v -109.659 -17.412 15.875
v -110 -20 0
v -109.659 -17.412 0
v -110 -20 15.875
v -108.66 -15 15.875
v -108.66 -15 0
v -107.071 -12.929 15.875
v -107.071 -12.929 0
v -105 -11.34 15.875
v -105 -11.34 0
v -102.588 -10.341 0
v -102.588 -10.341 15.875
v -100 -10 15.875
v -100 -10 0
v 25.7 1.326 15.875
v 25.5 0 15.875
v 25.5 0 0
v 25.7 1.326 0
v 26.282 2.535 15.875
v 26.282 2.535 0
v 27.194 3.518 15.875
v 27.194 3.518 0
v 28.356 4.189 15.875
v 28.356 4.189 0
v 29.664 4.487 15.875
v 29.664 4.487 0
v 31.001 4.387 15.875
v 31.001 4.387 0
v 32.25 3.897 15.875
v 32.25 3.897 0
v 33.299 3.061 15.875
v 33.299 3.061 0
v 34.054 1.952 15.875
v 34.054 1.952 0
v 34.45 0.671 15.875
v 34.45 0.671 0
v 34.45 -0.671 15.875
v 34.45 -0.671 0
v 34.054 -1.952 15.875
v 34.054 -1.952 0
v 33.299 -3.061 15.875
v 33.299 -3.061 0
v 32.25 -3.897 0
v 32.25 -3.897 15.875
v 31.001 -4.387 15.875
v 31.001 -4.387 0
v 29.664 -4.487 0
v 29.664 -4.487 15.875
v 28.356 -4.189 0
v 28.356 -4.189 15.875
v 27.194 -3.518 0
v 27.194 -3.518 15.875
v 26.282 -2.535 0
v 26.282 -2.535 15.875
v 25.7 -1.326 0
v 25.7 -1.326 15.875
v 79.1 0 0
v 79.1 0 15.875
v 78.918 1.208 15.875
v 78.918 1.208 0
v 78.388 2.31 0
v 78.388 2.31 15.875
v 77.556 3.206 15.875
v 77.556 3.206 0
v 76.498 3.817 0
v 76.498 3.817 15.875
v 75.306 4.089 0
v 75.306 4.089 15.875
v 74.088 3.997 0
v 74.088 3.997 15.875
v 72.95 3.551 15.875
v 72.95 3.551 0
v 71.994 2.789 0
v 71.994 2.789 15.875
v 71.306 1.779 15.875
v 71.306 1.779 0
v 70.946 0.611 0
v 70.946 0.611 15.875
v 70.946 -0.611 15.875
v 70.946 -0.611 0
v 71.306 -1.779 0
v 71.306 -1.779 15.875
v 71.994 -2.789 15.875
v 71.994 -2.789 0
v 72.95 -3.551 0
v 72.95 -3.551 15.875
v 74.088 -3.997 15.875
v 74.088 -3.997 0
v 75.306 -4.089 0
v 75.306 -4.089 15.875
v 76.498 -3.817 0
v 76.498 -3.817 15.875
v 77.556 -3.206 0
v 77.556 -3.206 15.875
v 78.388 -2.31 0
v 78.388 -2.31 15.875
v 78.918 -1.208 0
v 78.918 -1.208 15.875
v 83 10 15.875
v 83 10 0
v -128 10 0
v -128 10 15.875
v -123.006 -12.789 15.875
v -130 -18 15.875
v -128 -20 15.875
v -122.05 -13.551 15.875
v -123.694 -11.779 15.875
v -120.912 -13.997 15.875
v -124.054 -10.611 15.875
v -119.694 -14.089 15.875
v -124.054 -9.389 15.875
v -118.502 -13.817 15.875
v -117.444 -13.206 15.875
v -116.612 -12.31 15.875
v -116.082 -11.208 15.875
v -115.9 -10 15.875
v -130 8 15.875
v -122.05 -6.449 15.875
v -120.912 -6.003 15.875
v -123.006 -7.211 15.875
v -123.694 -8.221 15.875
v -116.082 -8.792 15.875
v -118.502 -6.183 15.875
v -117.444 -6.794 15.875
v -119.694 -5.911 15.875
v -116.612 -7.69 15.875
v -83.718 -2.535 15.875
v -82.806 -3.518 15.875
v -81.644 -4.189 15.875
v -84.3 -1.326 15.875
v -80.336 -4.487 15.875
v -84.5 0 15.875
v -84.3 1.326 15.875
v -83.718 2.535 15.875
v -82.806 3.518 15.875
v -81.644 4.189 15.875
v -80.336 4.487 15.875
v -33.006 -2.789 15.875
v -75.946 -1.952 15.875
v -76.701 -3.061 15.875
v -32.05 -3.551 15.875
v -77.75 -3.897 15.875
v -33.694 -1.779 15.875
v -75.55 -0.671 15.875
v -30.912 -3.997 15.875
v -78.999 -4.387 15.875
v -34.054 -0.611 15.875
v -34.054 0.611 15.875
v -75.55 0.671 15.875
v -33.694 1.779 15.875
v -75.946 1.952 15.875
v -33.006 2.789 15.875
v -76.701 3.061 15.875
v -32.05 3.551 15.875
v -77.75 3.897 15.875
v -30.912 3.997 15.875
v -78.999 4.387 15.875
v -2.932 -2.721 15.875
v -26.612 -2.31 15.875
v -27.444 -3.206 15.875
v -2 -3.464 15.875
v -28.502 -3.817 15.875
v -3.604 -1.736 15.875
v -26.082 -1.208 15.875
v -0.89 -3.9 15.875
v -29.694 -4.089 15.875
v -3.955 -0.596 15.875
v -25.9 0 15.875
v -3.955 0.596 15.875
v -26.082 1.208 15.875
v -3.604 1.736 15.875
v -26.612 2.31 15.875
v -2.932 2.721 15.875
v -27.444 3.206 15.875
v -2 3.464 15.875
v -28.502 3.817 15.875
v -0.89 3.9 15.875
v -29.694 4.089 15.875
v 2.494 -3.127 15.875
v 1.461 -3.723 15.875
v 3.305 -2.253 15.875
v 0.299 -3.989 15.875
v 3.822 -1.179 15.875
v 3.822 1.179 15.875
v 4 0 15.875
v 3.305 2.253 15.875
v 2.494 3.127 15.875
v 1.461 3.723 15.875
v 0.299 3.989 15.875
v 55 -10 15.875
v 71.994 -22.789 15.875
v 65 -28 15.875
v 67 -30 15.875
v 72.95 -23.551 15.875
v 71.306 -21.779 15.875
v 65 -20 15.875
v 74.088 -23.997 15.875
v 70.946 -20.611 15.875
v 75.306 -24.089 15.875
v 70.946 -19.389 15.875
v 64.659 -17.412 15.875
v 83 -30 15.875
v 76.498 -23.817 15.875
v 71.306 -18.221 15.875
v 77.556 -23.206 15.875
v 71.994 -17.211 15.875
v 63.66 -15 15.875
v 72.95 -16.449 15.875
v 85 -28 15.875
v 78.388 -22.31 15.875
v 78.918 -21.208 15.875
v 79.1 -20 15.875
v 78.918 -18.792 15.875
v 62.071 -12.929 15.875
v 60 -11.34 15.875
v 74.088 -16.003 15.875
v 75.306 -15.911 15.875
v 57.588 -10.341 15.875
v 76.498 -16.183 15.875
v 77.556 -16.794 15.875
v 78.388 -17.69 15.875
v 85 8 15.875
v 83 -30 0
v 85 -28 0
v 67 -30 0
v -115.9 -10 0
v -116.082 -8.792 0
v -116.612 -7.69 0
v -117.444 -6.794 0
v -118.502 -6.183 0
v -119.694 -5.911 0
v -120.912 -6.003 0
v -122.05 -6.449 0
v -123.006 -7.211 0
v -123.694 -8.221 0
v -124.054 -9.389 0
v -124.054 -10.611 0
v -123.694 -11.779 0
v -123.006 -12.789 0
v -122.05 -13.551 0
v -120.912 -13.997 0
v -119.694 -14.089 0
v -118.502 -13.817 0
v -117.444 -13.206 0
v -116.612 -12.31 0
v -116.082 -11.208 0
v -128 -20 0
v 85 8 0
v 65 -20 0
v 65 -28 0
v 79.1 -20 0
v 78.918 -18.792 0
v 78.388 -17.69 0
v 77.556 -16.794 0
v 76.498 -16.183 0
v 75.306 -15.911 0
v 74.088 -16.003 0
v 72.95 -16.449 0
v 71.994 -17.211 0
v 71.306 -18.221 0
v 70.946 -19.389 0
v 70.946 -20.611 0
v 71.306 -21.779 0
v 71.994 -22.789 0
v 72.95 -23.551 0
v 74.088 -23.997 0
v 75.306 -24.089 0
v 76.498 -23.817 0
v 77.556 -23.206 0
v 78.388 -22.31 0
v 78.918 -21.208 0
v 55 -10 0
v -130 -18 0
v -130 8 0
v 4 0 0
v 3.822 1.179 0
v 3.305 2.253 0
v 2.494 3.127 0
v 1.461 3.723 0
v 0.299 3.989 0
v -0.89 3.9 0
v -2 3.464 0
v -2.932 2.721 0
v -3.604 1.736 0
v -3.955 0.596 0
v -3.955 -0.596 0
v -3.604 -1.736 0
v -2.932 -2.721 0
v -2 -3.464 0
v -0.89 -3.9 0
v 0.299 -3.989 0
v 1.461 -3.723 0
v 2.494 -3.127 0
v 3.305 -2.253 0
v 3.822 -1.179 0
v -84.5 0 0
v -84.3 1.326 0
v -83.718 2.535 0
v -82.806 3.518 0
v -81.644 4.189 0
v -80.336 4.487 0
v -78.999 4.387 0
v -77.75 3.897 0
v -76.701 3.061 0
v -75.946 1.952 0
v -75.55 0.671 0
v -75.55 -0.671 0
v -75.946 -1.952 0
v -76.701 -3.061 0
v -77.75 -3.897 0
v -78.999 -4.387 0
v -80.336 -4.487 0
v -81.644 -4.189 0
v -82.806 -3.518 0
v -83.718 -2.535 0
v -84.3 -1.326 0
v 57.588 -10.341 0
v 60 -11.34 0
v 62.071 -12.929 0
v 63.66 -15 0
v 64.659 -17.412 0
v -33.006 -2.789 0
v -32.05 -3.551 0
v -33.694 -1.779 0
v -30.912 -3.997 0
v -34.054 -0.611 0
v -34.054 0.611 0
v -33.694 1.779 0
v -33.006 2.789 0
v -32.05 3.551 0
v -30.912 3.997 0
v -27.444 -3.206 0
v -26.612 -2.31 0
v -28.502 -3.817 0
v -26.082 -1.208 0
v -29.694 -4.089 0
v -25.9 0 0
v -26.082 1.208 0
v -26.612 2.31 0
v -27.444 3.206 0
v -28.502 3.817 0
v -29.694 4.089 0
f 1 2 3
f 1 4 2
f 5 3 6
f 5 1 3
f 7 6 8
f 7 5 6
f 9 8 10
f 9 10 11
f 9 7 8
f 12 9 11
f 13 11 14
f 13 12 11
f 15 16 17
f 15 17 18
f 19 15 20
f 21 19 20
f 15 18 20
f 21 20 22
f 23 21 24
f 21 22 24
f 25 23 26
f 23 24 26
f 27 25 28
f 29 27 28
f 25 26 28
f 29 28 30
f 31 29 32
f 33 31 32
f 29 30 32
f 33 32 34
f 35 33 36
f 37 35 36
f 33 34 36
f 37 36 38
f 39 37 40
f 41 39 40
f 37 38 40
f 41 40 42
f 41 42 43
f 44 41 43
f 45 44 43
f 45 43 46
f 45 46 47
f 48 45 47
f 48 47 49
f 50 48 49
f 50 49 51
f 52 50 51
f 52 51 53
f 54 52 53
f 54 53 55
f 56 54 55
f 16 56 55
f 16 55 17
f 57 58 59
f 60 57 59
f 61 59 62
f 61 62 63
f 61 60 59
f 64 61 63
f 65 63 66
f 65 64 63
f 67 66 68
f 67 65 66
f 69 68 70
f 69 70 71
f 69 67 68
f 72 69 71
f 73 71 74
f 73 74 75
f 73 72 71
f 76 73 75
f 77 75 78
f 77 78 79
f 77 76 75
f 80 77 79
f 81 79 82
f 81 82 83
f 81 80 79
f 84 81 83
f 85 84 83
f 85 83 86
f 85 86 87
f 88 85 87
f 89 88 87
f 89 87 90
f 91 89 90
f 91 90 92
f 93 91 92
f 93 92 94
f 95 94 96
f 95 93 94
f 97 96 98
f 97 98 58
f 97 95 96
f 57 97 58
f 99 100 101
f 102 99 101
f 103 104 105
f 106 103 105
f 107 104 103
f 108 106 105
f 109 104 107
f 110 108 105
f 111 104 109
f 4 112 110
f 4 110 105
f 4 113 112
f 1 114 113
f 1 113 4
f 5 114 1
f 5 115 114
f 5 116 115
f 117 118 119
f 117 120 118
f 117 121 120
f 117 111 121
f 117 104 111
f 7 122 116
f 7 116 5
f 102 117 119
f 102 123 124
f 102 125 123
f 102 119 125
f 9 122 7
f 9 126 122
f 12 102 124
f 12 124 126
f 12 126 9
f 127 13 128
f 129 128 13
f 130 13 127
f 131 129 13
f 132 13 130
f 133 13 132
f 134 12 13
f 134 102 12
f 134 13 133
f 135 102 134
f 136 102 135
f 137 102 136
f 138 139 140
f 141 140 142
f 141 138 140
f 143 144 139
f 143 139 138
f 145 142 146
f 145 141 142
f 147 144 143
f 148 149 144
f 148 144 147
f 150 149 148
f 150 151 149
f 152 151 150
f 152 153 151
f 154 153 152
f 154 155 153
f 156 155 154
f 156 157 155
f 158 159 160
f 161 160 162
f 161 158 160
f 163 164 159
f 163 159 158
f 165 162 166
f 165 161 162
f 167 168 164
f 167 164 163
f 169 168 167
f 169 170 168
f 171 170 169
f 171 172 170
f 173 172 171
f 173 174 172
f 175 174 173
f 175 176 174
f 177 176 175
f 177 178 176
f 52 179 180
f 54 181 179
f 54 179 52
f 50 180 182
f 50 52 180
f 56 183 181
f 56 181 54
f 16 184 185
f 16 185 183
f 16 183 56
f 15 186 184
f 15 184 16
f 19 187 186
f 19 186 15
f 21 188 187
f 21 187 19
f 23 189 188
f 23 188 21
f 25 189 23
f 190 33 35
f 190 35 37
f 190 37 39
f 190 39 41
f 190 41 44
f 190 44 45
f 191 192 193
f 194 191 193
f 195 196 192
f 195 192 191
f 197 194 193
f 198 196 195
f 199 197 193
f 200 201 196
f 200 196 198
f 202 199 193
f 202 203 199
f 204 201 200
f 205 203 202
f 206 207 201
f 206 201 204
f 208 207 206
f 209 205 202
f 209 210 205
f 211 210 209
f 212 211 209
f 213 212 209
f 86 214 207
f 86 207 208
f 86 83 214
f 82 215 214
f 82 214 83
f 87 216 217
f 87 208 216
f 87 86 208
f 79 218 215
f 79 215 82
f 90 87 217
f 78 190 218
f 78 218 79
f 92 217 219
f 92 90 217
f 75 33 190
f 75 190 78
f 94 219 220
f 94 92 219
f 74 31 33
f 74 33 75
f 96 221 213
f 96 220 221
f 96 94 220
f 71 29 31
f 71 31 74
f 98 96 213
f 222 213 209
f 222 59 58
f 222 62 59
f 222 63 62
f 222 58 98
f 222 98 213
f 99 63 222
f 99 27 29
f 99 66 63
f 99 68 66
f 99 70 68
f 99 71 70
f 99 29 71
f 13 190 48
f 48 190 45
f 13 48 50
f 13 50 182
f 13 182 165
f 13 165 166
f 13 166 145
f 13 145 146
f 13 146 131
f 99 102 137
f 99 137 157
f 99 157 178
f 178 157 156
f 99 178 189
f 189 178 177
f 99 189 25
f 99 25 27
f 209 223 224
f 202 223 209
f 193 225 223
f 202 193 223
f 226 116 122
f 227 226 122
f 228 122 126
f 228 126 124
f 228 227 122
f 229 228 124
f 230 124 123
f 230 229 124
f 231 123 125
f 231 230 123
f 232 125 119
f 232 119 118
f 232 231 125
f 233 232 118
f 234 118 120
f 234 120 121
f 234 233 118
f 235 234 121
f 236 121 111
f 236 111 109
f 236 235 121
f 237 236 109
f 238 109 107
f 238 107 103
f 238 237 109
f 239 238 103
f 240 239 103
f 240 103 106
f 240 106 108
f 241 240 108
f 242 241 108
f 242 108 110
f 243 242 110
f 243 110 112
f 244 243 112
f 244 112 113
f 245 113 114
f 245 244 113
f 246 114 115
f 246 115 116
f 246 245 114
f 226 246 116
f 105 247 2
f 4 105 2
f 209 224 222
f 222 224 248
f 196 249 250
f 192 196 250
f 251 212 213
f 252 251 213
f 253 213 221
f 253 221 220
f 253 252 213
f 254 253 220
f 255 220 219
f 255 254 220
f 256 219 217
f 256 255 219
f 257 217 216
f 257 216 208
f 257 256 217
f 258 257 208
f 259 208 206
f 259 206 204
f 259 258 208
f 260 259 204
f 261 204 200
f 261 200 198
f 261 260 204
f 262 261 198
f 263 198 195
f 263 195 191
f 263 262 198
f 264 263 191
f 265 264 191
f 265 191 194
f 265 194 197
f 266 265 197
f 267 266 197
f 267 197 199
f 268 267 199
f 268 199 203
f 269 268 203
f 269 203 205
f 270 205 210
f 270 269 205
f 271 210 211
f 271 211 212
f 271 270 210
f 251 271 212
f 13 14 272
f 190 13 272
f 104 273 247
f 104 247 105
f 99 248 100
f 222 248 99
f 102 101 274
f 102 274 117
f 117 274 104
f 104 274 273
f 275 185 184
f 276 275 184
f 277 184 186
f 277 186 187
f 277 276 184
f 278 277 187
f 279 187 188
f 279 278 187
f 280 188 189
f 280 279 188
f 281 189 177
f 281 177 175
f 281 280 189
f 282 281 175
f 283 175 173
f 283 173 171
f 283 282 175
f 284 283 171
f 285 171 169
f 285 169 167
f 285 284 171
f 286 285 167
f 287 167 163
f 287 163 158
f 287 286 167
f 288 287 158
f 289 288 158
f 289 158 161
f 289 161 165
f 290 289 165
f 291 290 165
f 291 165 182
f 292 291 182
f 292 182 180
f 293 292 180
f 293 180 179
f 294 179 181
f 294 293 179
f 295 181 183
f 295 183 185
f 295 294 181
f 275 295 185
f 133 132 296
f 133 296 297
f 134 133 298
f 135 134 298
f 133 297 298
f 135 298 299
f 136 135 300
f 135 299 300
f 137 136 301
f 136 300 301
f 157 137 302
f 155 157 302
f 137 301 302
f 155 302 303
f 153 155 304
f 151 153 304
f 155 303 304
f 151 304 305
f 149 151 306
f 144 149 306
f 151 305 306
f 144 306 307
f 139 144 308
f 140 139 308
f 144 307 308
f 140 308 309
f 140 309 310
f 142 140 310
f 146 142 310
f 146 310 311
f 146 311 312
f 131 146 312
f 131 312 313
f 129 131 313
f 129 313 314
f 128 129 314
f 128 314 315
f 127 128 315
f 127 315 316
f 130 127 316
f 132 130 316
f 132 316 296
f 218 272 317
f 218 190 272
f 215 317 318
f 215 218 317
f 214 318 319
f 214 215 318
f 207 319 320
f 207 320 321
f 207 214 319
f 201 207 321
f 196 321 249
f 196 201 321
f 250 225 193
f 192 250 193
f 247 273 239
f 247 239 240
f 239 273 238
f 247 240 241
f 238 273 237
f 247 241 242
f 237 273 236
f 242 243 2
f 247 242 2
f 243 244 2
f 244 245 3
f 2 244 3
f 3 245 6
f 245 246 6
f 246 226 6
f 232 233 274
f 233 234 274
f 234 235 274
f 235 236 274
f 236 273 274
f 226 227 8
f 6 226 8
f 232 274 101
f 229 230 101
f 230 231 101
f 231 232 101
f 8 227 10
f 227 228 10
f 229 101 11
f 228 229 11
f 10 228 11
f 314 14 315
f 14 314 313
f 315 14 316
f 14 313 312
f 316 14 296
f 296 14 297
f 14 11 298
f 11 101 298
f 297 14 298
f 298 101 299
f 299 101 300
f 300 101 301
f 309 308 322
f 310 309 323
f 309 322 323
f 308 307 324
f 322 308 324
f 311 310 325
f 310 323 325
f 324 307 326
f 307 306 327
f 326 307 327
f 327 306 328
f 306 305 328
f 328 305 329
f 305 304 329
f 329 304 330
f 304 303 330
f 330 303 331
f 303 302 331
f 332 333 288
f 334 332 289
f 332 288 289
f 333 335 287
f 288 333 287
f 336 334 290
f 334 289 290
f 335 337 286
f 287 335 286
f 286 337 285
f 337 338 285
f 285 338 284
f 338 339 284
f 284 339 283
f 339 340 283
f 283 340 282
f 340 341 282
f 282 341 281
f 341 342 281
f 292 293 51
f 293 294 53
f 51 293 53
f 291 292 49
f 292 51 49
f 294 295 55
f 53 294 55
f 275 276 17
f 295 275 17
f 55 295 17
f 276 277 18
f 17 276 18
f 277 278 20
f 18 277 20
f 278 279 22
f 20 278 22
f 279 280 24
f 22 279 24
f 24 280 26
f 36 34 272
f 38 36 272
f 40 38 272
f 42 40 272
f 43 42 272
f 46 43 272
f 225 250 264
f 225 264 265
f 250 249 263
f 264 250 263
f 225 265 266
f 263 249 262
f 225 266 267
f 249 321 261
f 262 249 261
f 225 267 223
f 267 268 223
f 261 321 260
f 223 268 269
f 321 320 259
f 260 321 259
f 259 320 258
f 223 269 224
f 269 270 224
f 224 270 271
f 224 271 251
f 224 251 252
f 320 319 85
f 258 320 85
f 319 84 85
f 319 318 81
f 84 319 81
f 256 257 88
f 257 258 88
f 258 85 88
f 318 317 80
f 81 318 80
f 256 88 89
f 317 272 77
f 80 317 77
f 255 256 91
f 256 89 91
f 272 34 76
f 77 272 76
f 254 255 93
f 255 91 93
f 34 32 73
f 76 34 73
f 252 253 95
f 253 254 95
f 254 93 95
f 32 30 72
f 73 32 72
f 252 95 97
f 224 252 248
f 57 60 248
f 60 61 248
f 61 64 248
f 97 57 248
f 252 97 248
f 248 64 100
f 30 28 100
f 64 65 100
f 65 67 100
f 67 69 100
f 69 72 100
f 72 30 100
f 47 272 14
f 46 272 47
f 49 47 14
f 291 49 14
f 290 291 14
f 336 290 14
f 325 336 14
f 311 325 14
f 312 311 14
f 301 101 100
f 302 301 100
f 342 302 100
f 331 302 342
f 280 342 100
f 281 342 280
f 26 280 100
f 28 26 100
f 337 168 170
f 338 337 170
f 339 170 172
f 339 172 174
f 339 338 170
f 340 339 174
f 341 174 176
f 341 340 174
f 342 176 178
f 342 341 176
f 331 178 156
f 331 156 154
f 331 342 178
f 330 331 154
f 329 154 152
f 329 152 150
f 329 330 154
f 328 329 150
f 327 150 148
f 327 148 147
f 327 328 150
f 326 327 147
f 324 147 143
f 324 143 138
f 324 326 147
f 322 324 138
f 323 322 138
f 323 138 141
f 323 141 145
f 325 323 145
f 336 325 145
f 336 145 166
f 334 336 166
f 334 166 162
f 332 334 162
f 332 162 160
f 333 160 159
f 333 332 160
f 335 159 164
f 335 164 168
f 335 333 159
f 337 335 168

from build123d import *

# Parameters (mm, degrees)
SKETCH_1_R          = 4
SKETCH_1_R_2        = 4.1
EXTRUDE_1_DEPTH     = 15.875
FILLET_1_R          = 10
CHAMFER_1_SIZE      = 2
SKETCH_2_R          = 4.5
CUT_EXTRUDE_1_DEPTH = 20
SKETCH_3_R          = 4.5
CUT_EXTRUDE_2_DEPTH = 20


with BuildPart() as part:
    # 草图1 → 凸台-拉伸1 (new body)
    with BuildSketch(Plane.XY):
        Polygon((0, 10), (-130, 10), (-130, -20), (-110, -20), (-110, -10), (0, -10), (65, -10), (65, -30), (85, -30), (85, 10), align=None)
        Circle(SKETCH_1_R, mode=Mode.SUBTRACT)
        with Locations((-30, 0)):
            Circle(SKETCH_1_R_2, mode=Mode.SUBTRACT)
        with Locations((75, 0)):
            Circle(SKETCH_1_R_2, mode=Mode.SUBTRACT)
        with Locations((75, -20)):
            Circle(SKETCH_1_R_2, mode=Mode.SUBTRACT)
        with Locations((-120, -10)):
            Circle(SKETCH_1_R_2, mode=Mode.SUBTRACT)
    extrude(amount=EXTRUDE_1_DEPTH)

    # 圆角1
    fillet_1_edges = [part.edges().sort_by_distance(p)[0] for p in [
        (65, -10, 7.9375),
        (-110, -10, 7.9375),
    ]]
    fillet(fillet_1_edges, radius=FILLET_1_R - 0.0001)  # a hair under: the kernel refuses the full size

    # 倒角1
    chamfer_1_edges = [part.edges().sort_by_distance(p)[0] for p in [
        (-130, 10, 7.9375),
        (85, 10, 7.9375),
        (85, -30, 7.9375),
        (65, -30, 7.9375),
        (-130, -20, 7.9375),
    ]]
    chamfer(chamfer_1_edges, length=CHAMFER_1_SIZE)

    # 草图2 → 切除-拉伸1 (cut)
    with BuildSketch(Plane(origin=(0, 0, 0), x_dir=(-1, 0, 0), z_dir=(0, 0, -1))):
        with Locations((-30, 0)):
            Circle(SKETCH_2_R)
    extrude(amount=-CUT_EXTRUDE_1_DEPTH, mode=Mode.SUBTRACT)

    # 草图3 → 切除-拉伸2 (cut)
    with BuildSketch(Plane(origin=(0, 0, 0), x_dir=(-1, 0, 0), z_dir=(0, 0, -1))):
        with Locations((80, 0)):
            Circle(SKETCH_3_R)
    extrude(amount=-CUT_EXTRUDE_2_DEPTH, mode=Mode.SUBTRACT)


solid = part.part
